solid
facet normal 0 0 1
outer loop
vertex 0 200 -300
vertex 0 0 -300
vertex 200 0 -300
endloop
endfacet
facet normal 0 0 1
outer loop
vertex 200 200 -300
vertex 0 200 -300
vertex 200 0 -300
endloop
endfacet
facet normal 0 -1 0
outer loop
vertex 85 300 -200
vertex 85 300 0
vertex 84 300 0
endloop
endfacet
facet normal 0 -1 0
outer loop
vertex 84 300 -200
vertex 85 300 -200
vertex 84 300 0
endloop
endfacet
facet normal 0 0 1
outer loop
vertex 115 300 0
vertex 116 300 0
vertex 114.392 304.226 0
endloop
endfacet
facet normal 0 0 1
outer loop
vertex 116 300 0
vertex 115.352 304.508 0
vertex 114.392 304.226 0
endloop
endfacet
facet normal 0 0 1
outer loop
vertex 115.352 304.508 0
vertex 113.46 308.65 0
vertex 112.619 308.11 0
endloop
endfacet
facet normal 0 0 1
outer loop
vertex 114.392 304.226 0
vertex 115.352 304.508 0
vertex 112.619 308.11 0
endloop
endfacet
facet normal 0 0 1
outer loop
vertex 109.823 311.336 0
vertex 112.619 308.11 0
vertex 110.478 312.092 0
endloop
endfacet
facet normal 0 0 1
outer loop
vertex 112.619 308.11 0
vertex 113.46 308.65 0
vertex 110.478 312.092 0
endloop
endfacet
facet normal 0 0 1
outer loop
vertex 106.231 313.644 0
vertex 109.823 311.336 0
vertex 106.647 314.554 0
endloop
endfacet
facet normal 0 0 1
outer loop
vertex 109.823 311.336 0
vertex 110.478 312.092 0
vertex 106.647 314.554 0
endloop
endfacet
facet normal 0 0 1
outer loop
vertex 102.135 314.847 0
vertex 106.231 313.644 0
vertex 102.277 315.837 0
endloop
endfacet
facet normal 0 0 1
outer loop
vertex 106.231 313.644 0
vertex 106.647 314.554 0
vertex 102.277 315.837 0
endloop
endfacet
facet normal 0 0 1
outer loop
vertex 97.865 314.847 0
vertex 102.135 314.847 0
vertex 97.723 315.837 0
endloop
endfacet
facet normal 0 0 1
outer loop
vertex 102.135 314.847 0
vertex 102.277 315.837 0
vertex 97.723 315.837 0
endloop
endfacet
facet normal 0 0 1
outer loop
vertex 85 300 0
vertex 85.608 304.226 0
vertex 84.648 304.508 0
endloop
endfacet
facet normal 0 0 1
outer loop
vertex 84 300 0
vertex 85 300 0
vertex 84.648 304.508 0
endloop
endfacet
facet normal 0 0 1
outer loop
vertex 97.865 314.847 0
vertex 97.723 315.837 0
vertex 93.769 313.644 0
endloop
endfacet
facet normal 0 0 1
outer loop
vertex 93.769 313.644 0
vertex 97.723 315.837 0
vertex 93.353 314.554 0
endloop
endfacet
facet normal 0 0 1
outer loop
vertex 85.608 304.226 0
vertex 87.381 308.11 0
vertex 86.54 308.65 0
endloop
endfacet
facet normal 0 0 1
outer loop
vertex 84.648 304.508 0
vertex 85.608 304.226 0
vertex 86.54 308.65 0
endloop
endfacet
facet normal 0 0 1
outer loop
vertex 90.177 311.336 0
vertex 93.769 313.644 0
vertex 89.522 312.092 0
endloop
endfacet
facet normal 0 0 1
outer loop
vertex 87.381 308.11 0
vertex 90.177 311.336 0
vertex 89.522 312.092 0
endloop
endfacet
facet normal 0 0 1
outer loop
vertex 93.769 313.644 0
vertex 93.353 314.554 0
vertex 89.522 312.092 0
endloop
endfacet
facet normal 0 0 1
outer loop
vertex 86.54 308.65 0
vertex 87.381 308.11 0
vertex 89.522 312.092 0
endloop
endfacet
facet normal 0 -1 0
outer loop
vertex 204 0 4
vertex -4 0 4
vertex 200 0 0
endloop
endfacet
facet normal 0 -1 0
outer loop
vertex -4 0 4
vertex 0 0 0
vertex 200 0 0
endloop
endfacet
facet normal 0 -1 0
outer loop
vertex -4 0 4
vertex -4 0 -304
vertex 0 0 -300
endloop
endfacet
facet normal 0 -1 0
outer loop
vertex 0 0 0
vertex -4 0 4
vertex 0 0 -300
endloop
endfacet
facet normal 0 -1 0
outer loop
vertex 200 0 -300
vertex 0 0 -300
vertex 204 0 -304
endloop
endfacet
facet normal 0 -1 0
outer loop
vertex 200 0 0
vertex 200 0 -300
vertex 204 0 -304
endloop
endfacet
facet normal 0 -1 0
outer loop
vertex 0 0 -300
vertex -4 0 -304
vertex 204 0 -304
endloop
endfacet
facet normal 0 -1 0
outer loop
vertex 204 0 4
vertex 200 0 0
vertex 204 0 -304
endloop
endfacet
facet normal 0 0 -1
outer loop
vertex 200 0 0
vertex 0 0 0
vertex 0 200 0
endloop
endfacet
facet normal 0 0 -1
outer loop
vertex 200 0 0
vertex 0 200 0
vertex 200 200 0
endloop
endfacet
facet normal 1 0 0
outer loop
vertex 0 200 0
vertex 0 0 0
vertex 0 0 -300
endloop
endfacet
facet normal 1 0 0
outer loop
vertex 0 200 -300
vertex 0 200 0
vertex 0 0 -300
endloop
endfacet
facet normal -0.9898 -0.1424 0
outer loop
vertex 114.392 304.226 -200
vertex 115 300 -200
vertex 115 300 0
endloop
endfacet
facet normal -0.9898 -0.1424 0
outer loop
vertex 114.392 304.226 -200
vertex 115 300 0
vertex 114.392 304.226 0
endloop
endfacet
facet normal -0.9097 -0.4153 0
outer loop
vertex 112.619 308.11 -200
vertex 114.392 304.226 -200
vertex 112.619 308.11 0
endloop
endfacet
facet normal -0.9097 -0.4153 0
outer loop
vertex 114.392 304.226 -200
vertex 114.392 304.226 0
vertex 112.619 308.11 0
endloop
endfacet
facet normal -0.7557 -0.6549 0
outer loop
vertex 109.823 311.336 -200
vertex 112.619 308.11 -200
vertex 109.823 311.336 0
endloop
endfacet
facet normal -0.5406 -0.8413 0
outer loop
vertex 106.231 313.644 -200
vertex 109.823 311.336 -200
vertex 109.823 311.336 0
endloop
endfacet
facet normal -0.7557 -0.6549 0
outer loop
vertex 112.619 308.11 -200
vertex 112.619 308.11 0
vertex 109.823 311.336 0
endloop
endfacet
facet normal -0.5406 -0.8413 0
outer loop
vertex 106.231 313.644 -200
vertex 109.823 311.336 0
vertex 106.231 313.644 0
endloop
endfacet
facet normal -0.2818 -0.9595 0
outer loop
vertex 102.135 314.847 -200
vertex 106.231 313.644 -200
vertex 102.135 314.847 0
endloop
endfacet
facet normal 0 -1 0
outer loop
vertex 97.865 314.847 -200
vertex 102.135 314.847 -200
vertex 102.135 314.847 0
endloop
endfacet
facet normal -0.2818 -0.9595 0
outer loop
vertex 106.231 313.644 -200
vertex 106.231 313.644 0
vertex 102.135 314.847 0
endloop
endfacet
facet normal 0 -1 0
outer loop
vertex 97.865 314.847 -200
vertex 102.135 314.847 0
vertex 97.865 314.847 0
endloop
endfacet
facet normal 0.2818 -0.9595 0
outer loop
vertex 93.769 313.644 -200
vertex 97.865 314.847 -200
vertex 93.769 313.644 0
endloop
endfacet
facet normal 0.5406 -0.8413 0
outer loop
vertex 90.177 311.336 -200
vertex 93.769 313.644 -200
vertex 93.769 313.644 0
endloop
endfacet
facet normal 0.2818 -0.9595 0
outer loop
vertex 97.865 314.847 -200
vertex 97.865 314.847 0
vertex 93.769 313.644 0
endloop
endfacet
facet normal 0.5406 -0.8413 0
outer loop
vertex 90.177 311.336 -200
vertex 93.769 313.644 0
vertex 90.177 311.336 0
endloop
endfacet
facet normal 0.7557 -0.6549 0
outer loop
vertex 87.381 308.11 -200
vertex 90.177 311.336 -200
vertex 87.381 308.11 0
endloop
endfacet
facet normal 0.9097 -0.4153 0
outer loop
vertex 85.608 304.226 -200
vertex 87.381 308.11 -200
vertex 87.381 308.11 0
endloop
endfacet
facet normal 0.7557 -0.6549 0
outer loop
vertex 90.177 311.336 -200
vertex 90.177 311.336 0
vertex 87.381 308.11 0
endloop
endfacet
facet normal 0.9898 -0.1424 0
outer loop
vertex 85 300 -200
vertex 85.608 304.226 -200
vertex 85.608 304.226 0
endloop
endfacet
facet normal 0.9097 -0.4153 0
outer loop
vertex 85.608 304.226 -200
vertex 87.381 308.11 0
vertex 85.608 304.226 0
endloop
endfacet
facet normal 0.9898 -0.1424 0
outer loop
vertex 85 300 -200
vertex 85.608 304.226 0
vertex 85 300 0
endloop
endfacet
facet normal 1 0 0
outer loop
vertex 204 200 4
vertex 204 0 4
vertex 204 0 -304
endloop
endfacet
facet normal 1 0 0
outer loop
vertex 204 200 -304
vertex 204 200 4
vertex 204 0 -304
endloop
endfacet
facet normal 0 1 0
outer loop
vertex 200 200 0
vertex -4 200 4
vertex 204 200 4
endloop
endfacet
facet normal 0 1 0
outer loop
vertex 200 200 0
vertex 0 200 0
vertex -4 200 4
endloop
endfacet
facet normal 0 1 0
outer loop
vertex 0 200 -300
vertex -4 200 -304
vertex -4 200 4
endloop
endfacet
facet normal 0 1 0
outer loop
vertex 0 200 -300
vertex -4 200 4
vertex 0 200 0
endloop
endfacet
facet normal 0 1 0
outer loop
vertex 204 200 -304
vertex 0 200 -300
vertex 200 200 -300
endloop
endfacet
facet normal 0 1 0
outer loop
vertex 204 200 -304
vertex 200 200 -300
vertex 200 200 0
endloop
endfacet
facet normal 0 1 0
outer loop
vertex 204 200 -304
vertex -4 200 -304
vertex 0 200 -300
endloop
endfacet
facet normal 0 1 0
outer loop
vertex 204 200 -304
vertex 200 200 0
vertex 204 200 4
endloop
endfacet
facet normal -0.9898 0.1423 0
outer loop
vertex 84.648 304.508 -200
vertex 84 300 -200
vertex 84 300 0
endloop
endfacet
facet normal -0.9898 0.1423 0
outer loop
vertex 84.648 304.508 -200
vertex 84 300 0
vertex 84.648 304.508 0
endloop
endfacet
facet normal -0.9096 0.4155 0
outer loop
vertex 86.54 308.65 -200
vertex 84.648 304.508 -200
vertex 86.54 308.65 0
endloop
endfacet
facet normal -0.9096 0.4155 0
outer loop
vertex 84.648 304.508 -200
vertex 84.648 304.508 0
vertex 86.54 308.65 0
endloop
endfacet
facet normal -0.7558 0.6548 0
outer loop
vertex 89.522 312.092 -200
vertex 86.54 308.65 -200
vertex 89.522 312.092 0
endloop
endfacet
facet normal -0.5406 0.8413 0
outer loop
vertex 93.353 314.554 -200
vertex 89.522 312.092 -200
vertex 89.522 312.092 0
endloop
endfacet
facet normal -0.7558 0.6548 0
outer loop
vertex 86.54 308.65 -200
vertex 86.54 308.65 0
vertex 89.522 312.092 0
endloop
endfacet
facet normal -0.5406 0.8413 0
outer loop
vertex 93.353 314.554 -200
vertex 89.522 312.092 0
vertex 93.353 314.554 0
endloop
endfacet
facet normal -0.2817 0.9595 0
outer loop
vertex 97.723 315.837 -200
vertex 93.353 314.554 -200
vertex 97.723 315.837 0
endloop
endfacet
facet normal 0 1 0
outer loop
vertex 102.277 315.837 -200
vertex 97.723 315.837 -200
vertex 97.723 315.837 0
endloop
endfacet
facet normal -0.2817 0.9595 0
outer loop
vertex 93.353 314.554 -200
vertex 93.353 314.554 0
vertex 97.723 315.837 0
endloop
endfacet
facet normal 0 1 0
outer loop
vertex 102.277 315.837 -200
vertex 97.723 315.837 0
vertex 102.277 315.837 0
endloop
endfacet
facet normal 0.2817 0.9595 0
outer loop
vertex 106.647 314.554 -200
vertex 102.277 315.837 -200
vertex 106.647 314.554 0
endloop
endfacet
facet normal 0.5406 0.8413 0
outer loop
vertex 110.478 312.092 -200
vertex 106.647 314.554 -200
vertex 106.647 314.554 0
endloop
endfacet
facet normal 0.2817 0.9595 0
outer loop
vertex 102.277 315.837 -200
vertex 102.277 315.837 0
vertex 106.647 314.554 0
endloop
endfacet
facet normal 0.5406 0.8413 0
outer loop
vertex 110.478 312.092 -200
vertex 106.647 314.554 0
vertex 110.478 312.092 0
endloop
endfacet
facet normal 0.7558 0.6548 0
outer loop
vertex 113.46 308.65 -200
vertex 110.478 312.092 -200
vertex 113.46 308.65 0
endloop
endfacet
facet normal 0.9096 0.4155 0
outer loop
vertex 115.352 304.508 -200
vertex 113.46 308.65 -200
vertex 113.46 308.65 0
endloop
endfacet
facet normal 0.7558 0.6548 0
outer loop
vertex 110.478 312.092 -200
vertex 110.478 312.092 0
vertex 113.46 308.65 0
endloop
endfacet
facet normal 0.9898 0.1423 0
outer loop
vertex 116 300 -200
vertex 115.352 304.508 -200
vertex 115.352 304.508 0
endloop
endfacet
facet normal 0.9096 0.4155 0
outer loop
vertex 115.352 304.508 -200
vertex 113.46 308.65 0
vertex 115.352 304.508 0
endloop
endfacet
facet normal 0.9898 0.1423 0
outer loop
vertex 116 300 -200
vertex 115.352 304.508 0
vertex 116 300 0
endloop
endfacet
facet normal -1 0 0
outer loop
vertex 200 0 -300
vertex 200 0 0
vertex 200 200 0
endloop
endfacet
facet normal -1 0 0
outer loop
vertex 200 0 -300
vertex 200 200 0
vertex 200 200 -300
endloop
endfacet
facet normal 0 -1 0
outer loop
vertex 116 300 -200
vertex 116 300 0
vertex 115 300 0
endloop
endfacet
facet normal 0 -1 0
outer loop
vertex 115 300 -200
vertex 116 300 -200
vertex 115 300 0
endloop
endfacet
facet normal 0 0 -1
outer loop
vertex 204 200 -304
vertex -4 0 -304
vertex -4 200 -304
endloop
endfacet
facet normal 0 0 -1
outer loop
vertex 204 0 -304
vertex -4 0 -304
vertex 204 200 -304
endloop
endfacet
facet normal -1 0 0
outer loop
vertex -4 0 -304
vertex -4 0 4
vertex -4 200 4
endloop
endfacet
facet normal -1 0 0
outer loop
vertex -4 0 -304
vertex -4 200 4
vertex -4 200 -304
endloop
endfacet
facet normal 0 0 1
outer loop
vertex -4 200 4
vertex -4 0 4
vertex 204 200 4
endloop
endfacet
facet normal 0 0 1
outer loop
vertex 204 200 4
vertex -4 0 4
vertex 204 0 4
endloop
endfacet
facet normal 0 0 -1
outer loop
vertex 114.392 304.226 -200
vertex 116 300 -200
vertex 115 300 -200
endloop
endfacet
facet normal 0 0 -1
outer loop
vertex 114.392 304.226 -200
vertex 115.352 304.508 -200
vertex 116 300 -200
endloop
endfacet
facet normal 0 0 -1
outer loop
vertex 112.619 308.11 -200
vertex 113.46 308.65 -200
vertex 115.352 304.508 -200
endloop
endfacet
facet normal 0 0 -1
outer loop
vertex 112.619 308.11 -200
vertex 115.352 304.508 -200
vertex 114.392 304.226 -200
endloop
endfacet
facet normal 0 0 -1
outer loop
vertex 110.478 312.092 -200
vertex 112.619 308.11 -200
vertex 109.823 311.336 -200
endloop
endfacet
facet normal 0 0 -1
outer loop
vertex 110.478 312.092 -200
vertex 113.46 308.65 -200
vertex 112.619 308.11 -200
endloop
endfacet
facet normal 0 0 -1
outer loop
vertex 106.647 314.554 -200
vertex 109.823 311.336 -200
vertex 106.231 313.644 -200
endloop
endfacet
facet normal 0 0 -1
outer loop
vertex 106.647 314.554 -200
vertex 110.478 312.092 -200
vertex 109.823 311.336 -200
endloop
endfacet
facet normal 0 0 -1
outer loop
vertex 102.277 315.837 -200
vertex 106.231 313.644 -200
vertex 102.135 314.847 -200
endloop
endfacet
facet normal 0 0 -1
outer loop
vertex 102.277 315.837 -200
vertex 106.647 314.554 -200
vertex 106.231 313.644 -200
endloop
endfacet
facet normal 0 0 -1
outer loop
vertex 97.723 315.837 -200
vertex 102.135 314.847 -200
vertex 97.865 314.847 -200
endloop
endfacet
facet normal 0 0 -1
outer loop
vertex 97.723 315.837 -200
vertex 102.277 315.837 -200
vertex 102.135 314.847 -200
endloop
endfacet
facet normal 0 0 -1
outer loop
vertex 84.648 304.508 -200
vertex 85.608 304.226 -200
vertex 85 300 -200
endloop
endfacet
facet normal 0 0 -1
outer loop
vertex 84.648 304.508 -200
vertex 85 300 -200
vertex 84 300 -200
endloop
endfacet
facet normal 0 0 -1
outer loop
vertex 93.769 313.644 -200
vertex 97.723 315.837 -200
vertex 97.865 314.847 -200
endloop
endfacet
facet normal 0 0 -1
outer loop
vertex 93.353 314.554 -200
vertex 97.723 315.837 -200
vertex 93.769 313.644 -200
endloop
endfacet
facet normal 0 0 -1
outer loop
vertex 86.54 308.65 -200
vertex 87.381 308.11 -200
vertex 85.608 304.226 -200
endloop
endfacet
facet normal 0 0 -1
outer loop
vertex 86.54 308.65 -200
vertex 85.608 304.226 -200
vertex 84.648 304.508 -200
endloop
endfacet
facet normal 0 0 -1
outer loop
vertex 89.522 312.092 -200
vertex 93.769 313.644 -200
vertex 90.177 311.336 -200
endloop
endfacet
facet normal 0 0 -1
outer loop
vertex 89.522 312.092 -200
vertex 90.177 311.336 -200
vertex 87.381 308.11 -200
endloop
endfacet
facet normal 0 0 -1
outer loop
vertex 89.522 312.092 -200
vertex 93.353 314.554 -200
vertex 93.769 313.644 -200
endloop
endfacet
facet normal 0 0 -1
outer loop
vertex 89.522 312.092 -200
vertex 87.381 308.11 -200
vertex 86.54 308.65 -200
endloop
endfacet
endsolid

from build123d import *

# Parameters (mm, degrees)
SKETCH1_W           = 208
SKETCH1_H           = 308
SKETCH1_W_2         = 200
SKETCH1_H_2         = 300
BOSS_EXTRUDE1_DEPTH = 200
BOSS_EXTRUDE2_START = -304
BOSS_EXTRUDE2_DEPTH = 200


with BuildPart() as part:
    # Sketch1 → Boss-Extrude1 (new body)
    with BuildSketch(Plane(origin=(0, 0, 0), x_dir=(1, 0, 0), z_dir=(0, 1, 0))):
        with Locations((100, 150)):
            Rectangle(SKETCH1_W, SKETCH1_H)
        with Locations((100, 150)):
            Rectangle(SKETCH1_W_2, SKETCH1_H_2, mode=Mode.SUBTRACT)
    extrude(amount=BOSS_EXTRUDE1_DEPTH)


with BuildPart() as body_2:
    # Sketch4 → Boss-Extrude2 (new body)
    with BuildSketch(Plane(origin=(0, 0, -304), x_dir=(-1, 0, 0), z_dir=(0, 0, -1)).offset(BOSS_EXTRUDE2_START)):
        with BuildLine():
            Line((-116, 300), (-115, 300))
            ThreePointArc((-115, 300), (-100, 315), (-85, 300))
            Line((-85, 300), (-84, 300))
            ThreePointArc((-84, 300), (-100, 316), (-116, 300))
        make_face()
    extrude(amount=BOSS_EXTRUDE2_DEPTH)


solid = Compound([part.part, body_2.part])
